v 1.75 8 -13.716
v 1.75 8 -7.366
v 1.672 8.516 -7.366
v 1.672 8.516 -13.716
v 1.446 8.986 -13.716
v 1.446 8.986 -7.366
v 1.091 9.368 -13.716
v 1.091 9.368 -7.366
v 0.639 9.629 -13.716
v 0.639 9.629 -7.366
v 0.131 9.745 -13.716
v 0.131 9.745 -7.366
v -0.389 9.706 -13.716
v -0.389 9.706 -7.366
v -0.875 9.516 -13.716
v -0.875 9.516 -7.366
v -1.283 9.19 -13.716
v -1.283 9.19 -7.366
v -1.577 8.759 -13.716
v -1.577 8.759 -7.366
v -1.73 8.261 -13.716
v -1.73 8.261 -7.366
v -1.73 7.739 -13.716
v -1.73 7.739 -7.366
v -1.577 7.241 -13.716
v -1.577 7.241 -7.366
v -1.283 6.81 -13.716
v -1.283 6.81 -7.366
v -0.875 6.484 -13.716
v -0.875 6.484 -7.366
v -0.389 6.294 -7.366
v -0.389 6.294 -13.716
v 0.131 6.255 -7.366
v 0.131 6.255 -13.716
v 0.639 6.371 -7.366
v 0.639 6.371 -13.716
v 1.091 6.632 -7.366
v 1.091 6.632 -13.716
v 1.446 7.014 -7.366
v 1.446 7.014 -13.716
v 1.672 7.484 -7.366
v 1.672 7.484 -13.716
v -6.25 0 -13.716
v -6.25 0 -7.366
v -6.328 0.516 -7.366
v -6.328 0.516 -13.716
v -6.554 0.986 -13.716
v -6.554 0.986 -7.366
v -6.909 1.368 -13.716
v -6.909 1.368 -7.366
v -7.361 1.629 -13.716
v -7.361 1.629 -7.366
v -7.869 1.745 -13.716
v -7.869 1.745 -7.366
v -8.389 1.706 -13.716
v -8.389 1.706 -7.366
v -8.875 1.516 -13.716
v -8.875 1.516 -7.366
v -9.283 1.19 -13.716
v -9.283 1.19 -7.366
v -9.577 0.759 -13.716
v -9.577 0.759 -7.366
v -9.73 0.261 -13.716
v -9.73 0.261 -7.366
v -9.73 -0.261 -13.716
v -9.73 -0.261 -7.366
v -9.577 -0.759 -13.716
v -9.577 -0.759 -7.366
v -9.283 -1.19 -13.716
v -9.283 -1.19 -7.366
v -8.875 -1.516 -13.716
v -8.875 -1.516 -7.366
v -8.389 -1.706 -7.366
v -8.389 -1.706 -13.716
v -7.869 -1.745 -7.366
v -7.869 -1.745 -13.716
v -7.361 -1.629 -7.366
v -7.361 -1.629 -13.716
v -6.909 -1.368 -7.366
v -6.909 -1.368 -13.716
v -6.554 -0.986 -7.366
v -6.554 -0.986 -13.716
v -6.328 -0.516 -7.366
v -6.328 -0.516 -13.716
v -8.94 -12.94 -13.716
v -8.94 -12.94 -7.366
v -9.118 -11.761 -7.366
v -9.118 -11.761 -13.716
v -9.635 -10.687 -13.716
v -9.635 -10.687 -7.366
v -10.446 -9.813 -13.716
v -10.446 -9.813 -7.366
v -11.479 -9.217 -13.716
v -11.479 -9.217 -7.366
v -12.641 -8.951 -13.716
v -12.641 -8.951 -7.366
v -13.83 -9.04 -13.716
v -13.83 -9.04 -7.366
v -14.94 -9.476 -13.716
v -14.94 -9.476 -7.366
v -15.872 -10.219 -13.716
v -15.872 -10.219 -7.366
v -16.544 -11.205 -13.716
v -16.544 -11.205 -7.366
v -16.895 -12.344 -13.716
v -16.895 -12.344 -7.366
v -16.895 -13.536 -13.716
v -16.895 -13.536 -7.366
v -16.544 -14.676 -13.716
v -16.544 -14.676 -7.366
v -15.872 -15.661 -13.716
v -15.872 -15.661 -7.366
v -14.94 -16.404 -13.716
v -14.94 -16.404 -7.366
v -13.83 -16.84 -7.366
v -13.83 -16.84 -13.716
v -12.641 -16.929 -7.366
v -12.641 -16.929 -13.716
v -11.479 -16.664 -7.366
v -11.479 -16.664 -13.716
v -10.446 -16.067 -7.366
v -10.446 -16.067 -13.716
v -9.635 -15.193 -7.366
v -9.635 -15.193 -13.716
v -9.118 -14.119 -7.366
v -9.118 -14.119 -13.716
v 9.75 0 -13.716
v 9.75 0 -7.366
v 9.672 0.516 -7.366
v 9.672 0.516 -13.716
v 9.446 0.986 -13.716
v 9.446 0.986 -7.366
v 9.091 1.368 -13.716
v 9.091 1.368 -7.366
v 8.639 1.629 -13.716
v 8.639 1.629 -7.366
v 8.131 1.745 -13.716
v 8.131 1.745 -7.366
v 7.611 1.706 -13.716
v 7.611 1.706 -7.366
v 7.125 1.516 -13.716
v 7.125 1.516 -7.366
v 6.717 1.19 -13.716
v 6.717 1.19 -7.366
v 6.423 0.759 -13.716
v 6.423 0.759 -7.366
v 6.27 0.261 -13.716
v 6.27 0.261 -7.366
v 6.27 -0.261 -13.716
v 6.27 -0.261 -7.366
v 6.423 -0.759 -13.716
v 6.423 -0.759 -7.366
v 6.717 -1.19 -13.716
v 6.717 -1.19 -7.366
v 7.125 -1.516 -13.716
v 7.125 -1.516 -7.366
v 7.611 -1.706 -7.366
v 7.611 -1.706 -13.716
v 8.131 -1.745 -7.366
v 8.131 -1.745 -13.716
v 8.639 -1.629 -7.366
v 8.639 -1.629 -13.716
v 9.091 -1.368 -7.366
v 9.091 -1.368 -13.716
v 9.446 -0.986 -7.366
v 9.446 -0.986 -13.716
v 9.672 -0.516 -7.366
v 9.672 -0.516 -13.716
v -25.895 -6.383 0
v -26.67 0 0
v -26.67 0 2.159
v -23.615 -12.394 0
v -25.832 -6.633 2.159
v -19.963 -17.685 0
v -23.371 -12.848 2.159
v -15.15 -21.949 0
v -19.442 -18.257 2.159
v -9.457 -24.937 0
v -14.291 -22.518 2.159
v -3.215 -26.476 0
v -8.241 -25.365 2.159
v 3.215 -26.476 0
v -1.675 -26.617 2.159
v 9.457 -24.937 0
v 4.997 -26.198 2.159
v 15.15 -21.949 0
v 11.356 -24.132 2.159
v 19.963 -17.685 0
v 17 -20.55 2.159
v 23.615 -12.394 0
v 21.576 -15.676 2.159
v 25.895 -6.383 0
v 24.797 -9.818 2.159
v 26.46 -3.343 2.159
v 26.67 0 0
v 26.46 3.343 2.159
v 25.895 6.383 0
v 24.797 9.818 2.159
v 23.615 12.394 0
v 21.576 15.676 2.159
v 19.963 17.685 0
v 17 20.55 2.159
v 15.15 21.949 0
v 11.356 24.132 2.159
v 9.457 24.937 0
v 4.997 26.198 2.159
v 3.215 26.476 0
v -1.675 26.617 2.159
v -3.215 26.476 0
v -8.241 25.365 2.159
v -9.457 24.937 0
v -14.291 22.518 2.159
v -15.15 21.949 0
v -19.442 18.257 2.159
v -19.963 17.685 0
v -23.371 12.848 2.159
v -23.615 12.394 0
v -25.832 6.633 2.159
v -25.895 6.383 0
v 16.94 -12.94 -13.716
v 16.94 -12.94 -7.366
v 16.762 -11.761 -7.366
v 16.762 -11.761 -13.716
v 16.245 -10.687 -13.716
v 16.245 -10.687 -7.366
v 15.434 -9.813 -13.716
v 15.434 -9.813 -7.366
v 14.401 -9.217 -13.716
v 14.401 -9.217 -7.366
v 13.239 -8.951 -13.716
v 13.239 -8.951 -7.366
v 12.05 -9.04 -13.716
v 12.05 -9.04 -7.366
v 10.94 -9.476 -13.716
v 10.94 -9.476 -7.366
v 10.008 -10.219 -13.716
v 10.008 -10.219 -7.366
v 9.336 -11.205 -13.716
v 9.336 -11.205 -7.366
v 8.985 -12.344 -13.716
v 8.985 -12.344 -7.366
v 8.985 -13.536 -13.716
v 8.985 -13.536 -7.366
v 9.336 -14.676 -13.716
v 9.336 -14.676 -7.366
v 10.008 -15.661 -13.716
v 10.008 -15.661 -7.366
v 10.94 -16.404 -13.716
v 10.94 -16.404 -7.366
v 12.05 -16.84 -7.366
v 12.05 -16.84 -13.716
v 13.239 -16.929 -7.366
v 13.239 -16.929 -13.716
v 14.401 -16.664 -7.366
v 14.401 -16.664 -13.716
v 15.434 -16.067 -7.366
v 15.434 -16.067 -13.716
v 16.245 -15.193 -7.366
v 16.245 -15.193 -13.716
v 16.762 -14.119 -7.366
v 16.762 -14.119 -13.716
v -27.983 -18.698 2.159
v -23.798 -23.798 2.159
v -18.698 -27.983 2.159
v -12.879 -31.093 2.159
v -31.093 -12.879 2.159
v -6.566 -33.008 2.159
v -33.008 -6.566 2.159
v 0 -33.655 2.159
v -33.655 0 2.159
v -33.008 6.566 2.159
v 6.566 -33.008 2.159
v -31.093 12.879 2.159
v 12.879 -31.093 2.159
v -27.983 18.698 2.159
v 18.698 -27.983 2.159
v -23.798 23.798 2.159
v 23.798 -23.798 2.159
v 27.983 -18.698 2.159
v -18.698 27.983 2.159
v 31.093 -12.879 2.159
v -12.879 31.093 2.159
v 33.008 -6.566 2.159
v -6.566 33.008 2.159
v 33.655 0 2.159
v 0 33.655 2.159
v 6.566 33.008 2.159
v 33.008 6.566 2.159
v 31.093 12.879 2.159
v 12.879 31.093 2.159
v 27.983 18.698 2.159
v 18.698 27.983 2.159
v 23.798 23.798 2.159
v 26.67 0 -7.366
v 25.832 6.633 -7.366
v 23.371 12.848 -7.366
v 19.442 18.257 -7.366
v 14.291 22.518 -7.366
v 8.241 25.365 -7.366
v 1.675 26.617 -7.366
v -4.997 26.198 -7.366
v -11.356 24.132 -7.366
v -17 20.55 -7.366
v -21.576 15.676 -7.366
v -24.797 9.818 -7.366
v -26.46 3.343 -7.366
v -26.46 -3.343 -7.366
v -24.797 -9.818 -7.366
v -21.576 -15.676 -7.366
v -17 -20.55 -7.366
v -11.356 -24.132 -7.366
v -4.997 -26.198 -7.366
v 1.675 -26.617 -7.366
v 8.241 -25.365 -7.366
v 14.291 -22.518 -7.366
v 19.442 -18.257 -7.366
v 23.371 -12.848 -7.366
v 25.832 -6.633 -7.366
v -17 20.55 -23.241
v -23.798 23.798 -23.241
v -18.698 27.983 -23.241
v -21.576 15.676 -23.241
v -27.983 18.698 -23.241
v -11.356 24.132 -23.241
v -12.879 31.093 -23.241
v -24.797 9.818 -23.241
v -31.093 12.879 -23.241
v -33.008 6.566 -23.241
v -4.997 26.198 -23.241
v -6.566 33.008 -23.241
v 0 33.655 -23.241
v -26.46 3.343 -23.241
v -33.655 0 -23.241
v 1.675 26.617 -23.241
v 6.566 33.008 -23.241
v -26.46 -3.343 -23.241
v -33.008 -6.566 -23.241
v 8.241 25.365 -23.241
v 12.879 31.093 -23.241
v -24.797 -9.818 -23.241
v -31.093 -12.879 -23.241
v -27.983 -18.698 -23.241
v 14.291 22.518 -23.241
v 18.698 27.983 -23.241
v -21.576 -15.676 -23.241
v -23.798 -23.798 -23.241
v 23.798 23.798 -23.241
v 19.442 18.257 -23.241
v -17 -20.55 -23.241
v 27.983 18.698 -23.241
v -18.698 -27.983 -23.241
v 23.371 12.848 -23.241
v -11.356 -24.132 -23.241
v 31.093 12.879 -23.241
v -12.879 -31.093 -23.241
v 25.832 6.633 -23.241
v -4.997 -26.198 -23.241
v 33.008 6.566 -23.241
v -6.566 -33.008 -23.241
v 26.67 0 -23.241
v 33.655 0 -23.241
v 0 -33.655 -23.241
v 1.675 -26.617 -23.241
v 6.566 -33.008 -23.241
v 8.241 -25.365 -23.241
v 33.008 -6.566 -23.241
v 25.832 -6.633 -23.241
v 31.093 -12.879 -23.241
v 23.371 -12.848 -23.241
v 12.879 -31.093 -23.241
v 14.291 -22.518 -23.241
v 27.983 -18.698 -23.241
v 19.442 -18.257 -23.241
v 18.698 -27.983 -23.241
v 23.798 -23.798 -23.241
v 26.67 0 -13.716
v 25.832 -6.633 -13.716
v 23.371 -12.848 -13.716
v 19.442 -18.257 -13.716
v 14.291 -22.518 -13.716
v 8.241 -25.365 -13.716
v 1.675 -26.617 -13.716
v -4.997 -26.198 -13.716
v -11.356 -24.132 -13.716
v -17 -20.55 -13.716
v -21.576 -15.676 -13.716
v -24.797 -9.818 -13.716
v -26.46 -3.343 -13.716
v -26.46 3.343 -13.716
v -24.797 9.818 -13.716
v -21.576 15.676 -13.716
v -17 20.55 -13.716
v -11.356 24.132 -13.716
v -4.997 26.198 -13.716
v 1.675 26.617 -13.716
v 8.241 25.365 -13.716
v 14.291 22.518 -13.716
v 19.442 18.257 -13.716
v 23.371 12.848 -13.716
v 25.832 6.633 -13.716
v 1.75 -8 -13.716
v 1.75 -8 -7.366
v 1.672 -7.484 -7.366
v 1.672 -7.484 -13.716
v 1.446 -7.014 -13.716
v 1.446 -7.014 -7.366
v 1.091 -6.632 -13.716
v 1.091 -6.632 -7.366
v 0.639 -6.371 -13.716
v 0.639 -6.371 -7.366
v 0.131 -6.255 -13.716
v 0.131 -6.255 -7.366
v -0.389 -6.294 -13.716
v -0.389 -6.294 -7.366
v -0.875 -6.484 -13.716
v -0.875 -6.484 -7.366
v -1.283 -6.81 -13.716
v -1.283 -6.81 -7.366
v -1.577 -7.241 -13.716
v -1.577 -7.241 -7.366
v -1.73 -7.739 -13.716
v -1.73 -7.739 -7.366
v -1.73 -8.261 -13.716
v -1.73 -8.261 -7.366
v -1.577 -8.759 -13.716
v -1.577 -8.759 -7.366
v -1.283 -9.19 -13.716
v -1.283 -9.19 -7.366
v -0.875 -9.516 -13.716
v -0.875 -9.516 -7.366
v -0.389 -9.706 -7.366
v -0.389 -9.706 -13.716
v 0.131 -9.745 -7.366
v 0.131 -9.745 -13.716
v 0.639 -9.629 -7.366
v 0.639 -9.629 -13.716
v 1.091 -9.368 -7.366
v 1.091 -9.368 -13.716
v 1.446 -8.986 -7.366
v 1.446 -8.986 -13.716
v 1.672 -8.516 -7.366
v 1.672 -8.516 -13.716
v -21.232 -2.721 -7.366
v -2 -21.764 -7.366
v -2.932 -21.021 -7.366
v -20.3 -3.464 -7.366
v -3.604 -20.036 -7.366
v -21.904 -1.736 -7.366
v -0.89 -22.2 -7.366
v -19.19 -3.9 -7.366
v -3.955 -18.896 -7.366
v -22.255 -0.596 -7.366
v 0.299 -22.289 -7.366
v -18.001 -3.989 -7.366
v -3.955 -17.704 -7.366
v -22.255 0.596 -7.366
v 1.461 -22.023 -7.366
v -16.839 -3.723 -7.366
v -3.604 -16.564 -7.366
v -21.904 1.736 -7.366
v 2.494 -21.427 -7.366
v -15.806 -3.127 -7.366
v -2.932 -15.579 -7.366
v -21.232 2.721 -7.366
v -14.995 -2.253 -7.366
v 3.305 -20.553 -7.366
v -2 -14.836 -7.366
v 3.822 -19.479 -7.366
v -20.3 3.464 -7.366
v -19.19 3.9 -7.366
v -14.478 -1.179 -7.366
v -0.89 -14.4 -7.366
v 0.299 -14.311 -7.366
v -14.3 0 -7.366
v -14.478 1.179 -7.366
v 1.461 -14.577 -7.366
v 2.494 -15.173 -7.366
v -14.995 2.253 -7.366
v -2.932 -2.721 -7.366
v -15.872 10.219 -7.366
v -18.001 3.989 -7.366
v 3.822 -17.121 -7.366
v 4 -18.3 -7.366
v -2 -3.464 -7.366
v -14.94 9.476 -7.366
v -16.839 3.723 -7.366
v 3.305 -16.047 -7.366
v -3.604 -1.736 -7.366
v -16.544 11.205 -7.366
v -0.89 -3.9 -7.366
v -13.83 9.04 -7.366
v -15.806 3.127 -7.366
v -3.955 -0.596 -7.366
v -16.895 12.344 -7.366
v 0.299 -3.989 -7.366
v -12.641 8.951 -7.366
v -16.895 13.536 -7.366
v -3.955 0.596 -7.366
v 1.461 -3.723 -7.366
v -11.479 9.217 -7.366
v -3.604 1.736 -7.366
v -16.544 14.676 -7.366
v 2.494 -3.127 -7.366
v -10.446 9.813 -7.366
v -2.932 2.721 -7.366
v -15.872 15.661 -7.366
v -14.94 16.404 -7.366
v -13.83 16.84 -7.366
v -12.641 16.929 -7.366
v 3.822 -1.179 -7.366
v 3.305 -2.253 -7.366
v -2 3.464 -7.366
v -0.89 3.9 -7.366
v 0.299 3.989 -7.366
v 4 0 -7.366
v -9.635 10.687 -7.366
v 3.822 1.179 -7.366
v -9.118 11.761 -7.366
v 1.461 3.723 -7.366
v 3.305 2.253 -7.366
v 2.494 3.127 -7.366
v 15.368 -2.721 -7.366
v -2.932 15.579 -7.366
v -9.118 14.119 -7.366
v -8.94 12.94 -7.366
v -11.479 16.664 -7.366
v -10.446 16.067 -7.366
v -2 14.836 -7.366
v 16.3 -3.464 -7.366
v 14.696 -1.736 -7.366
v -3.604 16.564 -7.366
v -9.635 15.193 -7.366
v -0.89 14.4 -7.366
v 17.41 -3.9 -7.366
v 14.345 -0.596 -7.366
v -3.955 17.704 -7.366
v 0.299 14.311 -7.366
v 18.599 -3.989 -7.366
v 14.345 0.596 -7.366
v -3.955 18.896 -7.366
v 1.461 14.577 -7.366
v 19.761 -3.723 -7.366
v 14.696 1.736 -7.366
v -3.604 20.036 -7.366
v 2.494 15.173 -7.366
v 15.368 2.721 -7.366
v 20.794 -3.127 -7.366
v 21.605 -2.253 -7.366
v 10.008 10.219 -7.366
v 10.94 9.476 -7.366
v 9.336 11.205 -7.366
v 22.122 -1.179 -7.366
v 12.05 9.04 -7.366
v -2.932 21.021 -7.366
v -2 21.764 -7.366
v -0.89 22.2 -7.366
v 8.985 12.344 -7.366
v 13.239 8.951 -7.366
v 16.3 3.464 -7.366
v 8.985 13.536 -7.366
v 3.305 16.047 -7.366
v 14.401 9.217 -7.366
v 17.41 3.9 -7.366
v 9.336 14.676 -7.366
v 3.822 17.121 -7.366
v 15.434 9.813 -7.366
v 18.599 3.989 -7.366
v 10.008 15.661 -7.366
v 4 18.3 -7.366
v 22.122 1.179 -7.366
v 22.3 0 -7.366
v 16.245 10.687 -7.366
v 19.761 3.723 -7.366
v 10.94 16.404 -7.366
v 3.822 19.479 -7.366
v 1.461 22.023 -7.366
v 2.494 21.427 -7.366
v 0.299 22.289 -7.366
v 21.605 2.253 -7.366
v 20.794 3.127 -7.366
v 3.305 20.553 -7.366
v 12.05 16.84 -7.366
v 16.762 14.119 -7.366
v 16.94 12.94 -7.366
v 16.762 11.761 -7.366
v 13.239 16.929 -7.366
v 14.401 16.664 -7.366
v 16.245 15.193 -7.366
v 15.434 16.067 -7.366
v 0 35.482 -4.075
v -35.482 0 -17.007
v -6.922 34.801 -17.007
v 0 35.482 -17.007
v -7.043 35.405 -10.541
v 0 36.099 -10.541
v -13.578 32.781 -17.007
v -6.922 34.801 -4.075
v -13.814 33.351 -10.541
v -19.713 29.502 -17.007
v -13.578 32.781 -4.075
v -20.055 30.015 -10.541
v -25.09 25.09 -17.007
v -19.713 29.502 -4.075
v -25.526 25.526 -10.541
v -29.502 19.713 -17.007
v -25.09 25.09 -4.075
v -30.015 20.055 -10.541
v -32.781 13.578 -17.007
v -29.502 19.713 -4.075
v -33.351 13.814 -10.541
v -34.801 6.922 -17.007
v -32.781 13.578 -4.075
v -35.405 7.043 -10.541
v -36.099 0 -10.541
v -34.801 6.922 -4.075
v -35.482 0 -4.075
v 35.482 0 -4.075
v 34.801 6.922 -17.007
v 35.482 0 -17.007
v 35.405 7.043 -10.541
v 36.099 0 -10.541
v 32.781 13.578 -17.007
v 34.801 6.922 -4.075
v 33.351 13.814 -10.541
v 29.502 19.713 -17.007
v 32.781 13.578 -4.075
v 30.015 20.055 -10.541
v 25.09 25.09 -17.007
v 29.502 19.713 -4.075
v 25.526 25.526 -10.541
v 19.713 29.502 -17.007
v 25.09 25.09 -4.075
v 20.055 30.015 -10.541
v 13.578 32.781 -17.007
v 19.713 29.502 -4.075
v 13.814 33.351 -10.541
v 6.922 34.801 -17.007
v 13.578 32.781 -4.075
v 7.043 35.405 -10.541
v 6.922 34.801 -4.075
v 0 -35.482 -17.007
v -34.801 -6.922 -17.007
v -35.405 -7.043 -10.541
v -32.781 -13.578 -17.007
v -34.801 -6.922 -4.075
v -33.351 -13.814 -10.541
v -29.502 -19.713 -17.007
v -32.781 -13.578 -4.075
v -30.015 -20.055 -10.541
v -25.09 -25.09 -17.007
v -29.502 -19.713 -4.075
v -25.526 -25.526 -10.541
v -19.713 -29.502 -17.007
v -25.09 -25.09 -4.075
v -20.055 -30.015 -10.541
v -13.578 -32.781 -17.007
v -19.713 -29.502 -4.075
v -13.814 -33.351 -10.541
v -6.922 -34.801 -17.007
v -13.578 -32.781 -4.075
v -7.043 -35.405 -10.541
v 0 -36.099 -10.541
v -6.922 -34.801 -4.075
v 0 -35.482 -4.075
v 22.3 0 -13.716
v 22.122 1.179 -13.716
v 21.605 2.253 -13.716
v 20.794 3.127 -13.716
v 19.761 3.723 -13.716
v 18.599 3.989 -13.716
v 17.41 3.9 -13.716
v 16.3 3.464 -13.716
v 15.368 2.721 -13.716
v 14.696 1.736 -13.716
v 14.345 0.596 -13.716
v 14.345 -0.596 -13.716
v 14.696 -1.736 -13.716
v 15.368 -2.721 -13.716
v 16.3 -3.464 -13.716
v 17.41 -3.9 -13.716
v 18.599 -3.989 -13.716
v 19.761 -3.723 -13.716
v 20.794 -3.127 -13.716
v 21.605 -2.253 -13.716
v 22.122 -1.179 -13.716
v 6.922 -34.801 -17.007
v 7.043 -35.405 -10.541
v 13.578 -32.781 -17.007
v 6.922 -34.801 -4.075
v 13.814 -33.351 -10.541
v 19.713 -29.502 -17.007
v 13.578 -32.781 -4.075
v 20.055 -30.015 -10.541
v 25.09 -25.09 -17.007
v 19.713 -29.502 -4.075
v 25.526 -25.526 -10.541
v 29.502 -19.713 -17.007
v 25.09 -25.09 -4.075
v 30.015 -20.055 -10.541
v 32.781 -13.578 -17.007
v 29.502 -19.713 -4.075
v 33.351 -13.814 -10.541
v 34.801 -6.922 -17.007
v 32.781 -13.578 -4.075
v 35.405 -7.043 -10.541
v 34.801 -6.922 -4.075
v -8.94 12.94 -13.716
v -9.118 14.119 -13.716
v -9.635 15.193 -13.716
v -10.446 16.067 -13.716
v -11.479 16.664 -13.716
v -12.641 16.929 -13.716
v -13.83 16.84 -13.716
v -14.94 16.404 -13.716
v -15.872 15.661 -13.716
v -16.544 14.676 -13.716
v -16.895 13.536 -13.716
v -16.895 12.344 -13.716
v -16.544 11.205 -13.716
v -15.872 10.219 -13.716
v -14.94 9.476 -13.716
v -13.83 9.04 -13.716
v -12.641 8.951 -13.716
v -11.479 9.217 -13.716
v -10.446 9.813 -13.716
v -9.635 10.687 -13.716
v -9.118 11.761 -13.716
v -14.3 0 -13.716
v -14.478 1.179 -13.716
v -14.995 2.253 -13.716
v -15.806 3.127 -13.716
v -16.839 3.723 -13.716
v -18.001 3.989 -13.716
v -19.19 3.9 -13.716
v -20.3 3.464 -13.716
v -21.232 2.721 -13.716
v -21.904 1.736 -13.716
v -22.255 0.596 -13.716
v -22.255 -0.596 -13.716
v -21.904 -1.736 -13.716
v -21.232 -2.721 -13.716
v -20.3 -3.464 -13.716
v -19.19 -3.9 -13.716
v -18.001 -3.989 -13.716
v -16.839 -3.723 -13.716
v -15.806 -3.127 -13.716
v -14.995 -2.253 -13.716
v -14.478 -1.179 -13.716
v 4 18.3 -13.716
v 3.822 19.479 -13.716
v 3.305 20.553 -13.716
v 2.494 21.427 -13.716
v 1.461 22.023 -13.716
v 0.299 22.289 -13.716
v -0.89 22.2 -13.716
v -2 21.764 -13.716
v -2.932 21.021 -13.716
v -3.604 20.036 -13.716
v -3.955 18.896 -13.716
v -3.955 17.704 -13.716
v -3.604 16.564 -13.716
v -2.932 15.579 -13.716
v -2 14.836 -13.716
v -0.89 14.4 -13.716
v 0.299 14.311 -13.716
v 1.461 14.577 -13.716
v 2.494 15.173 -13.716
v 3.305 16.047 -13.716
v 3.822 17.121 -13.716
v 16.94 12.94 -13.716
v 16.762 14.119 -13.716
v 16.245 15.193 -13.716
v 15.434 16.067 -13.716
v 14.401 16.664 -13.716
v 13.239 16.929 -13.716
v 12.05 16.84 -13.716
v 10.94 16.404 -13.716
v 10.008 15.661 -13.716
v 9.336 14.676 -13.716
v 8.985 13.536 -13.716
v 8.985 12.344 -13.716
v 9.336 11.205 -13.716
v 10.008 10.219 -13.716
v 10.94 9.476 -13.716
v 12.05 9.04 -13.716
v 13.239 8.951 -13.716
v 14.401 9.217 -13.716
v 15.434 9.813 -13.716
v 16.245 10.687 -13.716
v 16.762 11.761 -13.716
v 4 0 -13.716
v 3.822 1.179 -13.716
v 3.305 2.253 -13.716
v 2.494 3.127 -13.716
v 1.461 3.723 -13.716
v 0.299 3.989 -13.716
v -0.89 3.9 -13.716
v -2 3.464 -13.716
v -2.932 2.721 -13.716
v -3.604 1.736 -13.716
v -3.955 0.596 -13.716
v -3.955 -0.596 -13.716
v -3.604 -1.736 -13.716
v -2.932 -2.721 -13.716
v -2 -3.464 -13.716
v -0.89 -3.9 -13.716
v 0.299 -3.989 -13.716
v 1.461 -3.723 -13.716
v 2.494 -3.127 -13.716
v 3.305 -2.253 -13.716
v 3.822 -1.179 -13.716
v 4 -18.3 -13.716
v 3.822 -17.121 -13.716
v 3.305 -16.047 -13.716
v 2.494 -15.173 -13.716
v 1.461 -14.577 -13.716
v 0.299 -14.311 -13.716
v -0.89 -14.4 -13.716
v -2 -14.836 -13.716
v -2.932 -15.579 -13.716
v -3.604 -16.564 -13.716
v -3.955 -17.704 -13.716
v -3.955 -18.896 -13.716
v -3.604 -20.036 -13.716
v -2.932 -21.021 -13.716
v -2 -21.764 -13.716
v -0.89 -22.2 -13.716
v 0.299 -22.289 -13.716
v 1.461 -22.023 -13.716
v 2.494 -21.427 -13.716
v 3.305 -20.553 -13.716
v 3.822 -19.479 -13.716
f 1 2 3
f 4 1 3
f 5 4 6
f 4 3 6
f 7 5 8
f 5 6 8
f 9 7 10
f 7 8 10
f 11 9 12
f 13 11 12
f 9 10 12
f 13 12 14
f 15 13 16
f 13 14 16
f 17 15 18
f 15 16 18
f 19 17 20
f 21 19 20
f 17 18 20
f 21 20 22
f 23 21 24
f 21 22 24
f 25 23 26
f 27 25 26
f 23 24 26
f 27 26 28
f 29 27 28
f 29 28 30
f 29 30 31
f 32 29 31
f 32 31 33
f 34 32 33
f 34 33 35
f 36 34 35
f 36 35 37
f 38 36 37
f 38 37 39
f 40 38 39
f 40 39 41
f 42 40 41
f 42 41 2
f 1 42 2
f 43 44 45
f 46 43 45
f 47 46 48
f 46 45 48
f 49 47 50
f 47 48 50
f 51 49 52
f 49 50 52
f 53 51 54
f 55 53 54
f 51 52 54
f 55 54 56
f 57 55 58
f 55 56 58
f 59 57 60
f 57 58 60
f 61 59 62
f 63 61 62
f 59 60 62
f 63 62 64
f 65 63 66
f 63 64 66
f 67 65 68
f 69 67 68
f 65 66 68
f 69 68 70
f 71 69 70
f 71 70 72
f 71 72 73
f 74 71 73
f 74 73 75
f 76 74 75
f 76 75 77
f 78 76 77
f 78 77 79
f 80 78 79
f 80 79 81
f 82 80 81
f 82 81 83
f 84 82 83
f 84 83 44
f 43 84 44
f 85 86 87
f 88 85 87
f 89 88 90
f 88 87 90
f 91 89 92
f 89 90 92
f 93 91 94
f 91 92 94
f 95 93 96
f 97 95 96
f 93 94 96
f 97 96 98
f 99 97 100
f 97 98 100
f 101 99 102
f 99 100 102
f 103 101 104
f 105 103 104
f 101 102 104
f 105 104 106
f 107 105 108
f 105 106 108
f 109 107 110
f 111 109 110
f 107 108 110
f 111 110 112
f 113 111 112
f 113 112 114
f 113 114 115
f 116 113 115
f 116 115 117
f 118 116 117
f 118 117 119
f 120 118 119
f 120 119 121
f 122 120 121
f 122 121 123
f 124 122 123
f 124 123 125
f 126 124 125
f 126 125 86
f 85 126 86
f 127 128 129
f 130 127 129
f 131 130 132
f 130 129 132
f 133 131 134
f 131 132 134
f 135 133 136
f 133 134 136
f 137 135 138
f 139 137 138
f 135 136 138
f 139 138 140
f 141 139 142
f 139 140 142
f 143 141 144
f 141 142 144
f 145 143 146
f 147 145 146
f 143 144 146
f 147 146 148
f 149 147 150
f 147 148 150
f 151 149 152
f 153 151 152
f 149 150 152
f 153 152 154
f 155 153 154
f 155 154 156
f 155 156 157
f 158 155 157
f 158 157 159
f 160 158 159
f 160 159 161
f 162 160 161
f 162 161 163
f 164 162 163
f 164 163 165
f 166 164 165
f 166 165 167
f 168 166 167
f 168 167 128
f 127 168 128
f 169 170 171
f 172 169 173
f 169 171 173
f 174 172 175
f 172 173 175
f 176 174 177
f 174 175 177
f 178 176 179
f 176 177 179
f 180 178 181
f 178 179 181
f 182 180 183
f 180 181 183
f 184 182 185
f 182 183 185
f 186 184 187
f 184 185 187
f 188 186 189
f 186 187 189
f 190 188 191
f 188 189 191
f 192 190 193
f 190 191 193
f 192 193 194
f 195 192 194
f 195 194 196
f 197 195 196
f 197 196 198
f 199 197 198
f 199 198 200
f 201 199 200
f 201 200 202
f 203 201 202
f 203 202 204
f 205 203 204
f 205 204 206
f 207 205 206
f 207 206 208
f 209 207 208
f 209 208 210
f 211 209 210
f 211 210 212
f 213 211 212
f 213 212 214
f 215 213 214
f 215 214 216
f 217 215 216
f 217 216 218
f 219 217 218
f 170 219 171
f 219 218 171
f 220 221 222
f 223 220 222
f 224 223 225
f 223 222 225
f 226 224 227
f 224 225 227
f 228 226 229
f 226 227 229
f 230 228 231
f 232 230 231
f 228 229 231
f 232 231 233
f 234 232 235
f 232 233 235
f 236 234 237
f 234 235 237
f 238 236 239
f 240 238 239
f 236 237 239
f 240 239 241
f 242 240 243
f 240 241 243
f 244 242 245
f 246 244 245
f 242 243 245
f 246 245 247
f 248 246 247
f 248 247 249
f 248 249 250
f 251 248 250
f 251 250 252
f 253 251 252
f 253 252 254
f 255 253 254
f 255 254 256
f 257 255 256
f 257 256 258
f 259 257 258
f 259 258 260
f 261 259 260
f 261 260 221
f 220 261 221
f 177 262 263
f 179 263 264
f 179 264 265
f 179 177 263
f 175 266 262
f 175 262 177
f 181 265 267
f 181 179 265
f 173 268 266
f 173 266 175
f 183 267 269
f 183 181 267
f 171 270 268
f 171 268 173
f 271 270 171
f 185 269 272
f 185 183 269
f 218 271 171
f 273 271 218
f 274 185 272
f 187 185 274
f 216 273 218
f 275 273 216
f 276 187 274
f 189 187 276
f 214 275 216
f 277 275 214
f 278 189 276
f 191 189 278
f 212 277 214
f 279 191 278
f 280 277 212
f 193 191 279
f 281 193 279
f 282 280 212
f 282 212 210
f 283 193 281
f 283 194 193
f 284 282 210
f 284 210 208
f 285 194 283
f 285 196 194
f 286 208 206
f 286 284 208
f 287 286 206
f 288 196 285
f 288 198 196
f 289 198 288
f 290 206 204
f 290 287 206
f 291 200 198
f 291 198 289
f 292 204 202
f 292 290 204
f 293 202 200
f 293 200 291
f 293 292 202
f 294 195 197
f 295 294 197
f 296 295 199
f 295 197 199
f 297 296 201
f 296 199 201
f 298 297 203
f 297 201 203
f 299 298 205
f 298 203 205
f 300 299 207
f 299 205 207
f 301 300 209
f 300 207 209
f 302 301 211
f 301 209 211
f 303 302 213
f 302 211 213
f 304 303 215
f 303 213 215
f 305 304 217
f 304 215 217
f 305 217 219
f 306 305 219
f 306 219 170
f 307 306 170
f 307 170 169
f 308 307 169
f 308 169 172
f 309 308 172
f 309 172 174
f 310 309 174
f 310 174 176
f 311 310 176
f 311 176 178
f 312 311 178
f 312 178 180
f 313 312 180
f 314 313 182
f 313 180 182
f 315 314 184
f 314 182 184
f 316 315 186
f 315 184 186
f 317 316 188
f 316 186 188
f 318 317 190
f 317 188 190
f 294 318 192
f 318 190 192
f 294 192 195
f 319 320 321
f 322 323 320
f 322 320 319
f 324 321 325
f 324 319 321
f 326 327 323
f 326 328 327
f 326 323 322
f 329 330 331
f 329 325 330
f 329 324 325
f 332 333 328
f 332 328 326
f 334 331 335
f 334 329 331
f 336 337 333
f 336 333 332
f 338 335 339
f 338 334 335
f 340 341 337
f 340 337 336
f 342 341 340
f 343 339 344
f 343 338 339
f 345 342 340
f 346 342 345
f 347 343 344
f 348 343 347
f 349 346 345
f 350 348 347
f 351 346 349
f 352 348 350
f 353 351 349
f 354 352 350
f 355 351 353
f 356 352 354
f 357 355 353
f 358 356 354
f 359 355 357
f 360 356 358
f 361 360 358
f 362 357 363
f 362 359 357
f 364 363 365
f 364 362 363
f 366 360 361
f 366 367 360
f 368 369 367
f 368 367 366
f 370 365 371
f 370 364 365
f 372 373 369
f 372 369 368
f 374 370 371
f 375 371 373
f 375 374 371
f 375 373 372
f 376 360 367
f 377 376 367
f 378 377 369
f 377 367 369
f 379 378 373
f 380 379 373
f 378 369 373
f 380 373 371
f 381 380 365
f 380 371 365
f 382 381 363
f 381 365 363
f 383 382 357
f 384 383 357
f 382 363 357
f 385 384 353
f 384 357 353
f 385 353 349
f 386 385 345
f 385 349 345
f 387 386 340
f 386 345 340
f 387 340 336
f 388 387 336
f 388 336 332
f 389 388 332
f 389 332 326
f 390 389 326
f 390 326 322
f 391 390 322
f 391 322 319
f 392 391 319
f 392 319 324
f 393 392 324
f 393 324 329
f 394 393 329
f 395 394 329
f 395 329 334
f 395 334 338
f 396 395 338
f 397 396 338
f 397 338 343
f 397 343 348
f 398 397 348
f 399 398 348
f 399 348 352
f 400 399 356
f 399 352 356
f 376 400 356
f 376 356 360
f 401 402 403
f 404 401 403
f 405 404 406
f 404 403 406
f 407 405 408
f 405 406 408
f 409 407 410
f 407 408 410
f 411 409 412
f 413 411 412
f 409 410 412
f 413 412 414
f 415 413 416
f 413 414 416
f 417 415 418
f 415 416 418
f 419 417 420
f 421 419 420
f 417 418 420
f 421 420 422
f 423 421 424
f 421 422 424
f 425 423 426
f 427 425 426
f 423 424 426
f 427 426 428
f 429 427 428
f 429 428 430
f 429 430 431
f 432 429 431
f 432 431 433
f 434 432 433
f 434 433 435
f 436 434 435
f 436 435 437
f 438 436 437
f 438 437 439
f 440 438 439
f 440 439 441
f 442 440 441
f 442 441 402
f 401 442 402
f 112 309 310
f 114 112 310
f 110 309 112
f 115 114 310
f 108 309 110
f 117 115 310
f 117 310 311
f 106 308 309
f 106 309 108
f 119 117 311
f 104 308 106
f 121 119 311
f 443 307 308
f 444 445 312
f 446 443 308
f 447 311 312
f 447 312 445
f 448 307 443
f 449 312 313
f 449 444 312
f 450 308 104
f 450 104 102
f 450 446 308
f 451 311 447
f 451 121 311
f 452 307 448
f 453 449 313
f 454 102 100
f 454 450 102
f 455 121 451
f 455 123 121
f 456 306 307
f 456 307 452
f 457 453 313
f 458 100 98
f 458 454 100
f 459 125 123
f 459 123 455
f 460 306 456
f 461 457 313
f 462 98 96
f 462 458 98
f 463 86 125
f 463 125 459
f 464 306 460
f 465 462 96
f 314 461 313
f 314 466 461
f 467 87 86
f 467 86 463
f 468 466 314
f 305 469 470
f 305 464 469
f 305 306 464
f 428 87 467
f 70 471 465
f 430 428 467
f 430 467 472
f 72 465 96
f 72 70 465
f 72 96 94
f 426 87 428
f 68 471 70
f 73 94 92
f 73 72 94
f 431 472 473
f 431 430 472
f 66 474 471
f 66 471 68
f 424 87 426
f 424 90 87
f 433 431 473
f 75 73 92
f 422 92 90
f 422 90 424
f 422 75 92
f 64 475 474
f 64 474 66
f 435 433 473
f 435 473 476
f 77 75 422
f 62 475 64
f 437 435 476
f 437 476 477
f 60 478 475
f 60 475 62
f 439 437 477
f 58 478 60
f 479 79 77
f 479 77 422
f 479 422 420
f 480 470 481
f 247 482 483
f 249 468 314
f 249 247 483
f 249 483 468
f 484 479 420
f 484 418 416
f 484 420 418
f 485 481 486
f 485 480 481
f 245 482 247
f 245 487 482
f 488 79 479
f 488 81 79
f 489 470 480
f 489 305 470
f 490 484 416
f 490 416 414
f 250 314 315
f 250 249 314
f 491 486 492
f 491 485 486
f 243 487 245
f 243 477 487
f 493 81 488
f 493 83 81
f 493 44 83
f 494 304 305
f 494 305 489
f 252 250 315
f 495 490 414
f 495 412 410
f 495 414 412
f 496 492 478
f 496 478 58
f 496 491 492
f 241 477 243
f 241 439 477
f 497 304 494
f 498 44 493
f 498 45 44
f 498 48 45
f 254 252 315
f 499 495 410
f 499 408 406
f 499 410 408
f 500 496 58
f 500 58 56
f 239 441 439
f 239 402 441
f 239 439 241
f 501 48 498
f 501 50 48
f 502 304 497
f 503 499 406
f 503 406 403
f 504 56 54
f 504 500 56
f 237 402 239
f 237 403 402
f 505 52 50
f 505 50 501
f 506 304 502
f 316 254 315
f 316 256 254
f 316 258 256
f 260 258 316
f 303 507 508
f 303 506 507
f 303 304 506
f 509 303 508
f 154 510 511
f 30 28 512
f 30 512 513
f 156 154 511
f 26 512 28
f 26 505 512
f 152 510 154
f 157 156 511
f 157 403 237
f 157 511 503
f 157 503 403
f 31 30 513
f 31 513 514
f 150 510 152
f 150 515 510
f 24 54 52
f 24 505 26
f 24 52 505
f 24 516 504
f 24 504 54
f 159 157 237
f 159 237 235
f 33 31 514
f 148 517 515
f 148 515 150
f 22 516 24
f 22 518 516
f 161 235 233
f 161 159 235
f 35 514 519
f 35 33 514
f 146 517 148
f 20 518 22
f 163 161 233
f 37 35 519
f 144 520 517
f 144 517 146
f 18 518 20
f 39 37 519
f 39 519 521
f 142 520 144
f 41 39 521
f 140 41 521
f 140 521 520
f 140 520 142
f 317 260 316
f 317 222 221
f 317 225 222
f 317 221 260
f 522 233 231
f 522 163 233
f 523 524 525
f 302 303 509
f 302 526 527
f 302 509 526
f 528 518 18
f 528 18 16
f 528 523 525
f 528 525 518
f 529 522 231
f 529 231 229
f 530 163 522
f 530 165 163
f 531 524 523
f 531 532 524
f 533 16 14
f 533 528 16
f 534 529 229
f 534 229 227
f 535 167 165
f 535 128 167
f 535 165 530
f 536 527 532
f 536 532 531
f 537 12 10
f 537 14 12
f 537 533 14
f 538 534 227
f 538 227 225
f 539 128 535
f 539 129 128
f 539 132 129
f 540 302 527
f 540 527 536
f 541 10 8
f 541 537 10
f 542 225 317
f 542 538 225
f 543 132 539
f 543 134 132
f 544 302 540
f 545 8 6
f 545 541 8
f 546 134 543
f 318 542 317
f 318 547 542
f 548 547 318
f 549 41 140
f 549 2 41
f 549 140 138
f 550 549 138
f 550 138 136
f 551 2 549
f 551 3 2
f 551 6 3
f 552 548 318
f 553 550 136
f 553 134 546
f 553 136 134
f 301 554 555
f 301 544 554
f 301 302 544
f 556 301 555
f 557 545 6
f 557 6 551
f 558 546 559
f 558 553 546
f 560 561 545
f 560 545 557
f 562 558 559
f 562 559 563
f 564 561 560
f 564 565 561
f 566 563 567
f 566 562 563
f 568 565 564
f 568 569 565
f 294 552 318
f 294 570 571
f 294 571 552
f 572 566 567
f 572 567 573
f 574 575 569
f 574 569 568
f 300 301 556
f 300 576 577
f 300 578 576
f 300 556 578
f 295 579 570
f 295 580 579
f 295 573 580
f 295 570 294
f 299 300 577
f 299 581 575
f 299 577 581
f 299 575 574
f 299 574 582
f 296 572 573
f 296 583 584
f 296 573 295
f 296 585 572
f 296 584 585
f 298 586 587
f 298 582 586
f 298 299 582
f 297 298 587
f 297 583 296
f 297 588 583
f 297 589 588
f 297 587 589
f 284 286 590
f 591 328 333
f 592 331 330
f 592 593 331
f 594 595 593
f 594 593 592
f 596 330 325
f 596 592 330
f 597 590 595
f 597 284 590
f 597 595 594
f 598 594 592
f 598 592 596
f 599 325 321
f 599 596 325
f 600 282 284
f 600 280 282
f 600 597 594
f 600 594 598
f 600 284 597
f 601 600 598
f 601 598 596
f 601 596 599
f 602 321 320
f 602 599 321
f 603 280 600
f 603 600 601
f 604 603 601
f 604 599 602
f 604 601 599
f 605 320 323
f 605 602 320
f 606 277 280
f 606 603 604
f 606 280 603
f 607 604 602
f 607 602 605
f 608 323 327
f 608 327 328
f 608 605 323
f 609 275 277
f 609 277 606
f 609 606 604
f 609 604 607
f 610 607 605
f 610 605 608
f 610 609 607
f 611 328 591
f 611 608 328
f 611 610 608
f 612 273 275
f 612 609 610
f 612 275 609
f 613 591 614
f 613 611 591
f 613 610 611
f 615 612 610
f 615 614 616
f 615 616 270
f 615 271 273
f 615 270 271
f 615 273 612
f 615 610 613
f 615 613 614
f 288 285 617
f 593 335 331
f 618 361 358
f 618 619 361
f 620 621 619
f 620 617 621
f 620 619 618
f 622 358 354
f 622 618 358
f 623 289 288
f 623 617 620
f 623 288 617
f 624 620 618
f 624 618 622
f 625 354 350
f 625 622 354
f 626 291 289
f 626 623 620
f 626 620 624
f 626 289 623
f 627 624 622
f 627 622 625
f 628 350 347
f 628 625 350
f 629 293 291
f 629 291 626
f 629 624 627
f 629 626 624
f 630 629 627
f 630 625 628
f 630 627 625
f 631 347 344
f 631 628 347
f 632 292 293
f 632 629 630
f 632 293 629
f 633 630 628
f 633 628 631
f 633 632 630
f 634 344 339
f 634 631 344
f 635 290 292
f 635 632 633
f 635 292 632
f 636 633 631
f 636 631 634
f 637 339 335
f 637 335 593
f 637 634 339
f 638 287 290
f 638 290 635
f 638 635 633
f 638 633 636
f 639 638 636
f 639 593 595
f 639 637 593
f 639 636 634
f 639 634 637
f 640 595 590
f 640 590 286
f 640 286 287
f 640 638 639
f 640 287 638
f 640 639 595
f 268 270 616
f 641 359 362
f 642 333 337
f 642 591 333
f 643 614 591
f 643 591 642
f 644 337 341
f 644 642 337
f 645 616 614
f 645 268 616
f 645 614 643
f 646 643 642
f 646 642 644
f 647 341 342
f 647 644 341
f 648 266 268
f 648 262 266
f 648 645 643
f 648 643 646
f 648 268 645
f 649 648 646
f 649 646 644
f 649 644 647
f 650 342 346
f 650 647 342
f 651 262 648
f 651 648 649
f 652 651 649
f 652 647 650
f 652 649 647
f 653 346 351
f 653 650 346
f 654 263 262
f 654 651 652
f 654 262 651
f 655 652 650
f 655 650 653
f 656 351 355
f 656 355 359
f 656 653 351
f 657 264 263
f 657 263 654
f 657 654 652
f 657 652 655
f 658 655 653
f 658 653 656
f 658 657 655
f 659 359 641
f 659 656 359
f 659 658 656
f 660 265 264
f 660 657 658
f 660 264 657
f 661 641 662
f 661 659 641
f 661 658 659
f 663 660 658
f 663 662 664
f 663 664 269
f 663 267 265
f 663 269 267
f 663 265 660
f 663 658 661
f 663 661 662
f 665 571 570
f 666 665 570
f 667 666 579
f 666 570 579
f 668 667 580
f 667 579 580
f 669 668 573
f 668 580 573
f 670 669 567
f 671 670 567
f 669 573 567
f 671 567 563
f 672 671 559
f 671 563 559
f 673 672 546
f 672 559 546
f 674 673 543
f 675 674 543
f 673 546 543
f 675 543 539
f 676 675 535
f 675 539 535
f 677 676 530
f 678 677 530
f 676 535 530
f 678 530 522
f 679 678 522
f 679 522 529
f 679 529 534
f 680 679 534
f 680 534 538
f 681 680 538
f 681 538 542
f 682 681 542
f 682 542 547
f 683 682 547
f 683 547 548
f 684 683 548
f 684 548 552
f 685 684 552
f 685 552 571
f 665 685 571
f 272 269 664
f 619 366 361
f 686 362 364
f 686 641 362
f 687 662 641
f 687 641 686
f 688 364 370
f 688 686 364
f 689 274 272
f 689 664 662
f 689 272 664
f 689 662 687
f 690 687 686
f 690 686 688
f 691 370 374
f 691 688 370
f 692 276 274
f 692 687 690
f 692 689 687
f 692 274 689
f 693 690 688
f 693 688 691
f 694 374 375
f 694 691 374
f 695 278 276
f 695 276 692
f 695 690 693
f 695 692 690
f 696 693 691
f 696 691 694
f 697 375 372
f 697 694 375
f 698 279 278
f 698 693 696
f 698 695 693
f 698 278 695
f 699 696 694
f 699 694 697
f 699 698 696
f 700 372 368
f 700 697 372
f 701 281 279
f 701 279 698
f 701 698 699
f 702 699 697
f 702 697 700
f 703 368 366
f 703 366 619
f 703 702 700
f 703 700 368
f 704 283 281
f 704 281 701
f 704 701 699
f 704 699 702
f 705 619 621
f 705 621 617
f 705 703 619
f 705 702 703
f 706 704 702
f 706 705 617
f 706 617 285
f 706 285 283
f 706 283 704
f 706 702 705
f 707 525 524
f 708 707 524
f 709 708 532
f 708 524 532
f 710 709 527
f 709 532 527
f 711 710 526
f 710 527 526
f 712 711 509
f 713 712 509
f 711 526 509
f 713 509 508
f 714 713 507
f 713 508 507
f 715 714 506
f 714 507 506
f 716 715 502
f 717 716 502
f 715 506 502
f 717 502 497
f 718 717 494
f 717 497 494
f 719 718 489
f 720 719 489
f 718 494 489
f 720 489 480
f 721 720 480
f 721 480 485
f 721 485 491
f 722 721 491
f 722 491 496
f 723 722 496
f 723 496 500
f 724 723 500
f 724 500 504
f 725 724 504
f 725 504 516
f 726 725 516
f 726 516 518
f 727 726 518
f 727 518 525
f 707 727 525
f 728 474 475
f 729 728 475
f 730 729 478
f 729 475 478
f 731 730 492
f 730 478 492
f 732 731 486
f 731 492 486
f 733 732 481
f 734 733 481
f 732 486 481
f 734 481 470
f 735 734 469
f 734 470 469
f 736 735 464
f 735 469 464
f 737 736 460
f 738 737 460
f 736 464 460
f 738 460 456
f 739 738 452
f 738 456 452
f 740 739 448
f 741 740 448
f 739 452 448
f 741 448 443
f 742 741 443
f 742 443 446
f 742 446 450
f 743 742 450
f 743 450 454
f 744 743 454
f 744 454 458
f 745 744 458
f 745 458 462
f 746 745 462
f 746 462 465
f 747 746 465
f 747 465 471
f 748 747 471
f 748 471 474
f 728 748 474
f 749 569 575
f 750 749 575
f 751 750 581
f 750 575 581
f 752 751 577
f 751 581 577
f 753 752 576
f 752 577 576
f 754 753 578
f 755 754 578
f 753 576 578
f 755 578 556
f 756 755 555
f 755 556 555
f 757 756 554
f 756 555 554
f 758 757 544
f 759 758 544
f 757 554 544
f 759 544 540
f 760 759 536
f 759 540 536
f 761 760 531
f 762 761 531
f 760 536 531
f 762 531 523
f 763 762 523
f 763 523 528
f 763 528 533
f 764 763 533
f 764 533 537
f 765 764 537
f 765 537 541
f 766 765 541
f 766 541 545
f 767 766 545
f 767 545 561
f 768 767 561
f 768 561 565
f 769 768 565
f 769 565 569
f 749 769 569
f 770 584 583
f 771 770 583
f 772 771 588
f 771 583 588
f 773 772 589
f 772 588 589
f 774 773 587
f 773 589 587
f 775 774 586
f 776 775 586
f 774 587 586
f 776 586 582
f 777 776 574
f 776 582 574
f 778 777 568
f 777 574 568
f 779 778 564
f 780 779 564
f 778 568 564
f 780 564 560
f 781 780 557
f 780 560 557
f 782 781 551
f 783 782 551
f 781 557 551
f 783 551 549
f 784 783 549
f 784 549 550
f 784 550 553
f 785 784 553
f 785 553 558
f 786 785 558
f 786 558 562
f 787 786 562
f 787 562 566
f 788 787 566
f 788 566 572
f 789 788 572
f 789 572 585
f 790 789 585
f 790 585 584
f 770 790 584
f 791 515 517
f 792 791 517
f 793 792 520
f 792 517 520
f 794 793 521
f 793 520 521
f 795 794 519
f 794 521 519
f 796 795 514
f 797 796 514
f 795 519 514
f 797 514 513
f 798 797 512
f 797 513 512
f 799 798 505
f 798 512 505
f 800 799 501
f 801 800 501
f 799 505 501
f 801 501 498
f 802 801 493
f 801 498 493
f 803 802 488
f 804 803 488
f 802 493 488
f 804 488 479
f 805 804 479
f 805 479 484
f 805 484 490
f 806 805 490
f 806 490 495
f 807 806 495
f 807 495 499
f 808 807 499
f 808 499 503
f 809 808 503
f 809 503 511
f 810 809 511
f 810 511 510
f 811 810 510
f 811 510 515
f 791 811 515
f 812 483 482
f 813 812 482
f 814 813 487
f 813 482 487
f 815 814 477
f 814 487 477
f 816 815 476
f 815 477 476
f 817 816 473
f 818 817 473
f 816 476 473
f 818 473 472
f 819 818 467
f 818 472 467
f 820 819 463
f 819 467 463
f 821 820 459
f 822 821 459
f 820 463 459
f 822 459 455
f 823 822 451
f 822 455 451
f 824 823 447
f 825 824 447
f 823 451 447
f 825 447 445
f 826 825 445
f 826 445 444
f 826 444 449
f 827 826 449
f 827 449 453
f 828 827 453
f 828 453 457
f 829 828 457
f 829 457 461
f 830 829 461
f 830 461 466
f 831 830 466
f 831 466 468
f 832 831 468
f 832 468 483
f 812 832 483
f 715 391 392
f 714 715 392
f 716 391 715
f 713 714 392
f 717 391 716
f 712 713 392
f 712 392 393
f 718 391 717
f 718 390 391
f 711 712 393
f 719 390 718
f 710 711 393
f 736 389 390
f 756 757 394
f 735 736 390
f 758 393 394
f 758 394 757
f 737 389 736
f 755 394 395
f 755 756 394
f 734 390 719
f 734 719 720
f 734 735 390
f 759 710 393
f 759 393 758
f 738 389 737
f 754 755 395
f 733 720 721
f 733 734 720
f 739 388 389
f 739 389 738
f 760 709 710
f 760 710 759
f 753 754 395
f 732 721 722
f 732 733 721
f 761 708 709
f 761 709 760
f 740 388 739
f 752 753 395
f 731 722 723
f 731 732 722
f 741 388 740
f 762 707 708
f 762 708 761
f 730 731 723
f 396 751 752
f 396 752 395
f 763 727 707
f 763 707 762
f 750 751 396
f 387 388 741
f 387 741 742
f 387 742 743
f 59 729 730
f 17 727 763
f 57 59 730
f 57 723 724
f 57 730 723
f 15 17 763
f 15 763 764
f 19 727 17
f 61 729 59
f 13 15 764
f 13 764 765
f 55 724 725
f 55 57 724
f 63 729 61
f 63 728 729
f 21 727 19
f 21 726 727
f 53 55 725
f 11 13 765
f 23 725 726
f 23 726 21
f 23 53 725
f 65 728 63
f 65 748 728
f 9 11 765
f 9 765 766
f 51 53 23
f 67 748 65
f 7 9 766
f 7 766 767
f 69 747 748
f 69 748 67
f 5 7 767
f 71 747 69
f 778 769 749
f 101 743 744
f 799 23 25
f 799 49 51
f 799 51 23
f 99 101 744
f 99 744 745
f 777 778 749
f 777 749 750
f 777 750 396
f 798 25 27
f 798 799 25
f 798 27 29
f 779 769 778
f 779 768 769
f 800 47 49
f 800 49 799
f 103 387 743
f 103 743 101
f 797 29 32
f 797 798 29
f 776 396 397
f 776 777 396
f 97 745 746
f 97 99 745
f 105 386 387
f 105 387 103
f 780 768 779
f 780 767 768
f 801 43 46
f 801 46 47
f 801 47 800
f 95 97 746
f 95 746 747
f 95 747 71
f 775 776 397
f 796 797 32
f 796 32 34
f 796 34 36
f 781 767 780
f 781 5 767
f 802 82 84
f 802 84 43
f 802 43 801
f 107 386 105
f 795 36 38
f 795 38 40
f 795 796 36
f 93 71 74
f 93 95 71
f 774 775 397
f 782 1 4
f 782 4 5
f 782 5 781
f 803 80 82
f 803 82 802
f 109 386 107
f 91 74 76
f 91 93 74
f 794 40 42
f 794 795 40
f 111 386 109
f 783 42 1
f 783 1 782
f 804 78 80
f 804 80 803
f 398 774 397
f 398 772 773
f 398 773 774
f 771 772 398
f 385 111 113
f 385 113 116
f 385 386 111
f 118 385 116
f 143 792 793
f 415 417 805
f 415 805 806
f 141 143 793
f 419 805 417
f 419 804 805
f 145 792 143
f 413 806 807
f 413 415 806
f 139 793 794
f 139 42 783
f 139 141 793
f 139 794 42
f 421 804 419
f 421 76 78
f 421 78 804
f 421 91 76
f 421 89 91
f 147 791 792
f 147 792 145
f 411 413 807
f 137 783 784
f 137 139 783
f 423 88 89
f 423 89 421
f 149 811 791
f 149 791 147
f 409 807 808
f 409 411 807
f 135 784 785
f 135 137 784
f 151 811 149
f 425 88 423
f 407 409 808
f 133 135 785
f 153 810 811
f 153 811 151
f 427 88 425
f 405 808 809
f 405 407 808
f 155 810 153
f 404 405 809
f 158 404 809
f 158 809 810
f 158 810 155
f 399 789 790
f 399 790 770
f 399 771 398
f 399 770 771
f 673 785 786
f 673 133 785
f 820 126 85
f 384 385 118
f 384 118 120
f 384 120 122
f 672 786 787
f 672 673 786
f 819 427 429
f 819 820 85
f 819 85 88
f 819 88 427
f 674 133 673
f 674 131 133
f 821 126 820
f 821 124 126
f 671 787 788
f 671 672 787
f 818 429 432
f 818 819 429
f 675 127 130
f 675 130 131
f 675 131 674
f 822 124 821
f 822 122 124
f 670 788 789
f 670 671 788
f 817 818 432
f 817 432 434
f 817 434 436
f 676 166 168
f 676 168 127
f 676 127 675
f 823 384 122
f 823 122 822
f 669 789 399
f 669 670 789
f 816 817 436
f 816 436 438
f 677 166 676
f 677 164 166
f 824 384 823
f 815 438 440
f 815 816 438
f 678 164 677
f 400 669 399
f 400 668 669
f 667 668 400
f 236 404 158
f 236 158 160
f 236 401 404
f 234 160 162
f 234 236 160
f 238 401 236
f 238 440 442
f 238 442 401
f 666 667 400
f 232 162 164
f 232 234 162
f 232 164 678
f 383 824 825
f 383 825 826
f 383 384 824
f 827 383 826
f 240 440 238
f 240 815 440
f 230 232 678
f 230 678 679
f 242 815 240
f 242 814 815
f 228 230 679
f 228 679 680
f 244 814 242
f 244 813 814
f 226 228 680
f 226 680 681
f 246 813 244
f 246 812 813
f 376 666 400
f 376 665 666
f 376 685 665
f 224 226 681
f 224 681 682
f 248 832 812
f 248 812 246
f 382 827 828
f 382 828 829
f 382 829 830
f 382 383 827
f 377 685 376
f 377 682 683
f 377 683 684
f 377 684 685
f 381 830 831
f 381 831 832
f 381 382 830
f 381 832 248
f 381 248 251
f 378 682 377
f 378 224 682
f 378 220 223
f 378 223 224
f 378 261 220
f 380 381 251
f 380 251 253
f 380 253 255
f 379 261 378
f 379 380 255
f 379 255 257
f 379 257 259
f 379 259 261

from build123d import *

# Parameters (mm, degrees)
SKETCH1_R          = 31.75
EXTRUDE1_DEPTH     = 21.082
SKETCH2_R          = 26.67
CUT_EXTRUDE1_DEPTH = 7.366
SKETCH3_R          = 26.67
CUT_EXTRUDE2_DEPTH = 7.366
SKETCH5_R          = 33.655
EXTRUDE3_DEPTH     = 2.159
CUT_EXTRUDE3_REACH = 54.967
SKETCH6_R          = 26.67
SKETCH7_R          = 33.655
EXTRUDE4_DEPTH     = 2.159
CUT_EXTRUDE4_REACH = 55.949
SKETCH8_R          = 26.67
SKETCH10_R         = 4
SKETCH10_R_2       = 1.75
CUT_EXTRUDE5_DEPTH = 54.462758337
SKETCH11_R         = 4
CUT_EXTRUDE6_DEPTH = 54.462758337
SKETCH12_R         = 4
CUT_EXTRUDE7_DEPTH = 54.462758337


with BuildPart() as part:
    # Sketch1 → Extrude1 (new body)
    with BuildSketch(Plane.XY):
        Circle(SKETCH1_R)
    extrude(amount=-EXTRUDE1_DEPTH)

    # Sketch2 → Cut-Extrude1 (cut)
    with BuildSketch(Plane.XY):
        Circle(SKETCH2_R)
    extrude(amount=-CUT_EXTRUDE1_DEPTH, mode=Mode.SUBTRACT)

    # Sketch3 → Cut-Extrude2 (cut)
    with BuildSketch(Plane(origin=(0, 0, -21.082), x_dir=(-1, 0, 0), z_dir=(0, 0, -1))):
        with Locations(Location((0, 0, 0), (0, 0, 180))):
            Circle(SKETCH3_R)
    extrude(amount=-CUT_EXTRUDE2_DEPTH, mode=Mode.SUBTRACT)

    # Sketch5 → Extrude3 (add)
    with BuildSketch(Plane.XY):
        Circle(SKETCH5_R)
    extrude(amount=EXTRUDE3_DEPTH)

    # Sketch6 → Cut-Extrude3 (cut, up to next)
    with BuildSketch(Plane.XY.offset(2.159), mode=Mode.PRIVATE) as cut_extrude3_sk1:
        with Locations(Location((0, 0, 0), (0, 0, 180))):
            Circle(SKETCH6_R)
    cut_extrude3_tool1 = extrude(cut_extrude3_sk1.sketch, amount=-CUT_EXTRUDE3_REACH, mode=Mode.PRIVATE) & part.part
    add(cut_extrude3_tool1.solids().sort_by_distance((0, 0, 2.159))[0], mode=Mode.SUBTRACT)

    # Sketch7 → Extrude4 (add)
    with BuildSketch(Plane(origin=(0, 0, -21.082), x_dir=(-1, 0, 0), z_dir=(0, 0, -1))):
        with Locations(Location((0, 0, 0), (0, 0, 180))):
            Circle(SKETCH7_R)
    extrude(amount=EXTRUDE4_DEPTH)

    # Sketch8 → Cut-Extrude4 (cut, up to next)
    with BuildSketch(Plane(origin=(0, 0, -23.241), x_dir=(-1, 0, 0), z_dir=(0, 0, -1)), mode=Mode.PRIVATE) as cut_extrude4_sk1:
        with Locations(Location((0, 0, 0), (0, 0, 180))):
            Circle(SKETCH8_R)
    cut_extrude4_tool1 = extrude(cut_extrude4_sk1.sketch, amount=-CUT_EXTRUDE4_REACH, mode=Mode.PRIVATE) & part.part
    add(cut_extrude4_tool1.solids().sort_by_distance((0, 0, -23.241))[0], mode=Mode.SUBTRACT)

    # Sweep2: sweep along a curve in space
    with BuildLine() as sweep2_path:
        ThreePointArc((33.655, 0, 2.159), (23.797678721, 23.797678721, 2.159), (0, 33.655, 2.159))
        ThreePointArc((0, 33.655, 2.159), (-23.797678721, 23.797678721, 2.159), (-33.655, 0, 2.159))
        ThreePointArc((-33.655, 0, 2.159), (-23.797678721, -23.797678721, 2.159), (0, -33.655, 2.159))
        ThreePointArc((0, -33.655, 2.159), (23.797678721, -23.797678721, 2.159), (33.655, 0, 2.159))
    # 3DSketch2 → Sweep2 (sweep)
    with BuildSketch(Plane(origin=(0, 33.655, 2.159), x_dir=(-8.931812198350224e-14, -0.9285876208505301, -0.37111323124236906), z_dir=(1, 0, 0))):
        with BuildLine():
            Line((0, 0), (0.801233466, 2.004820673))
            Line((0.801233466, 2.004820673), (2.570192884, 1.297849968))
            Line((2.570192884, 1.297849968), (10.394002025, 20.874334191))
            Line((10.394002025, 20.874334191), (8.625042607, 21.581304896))
            Line((8.625042607, 21.581304896), (9.426276074, 23.58612557))
            ThreePointArc((9.426276074, 23.58612557), (2.443828834, 12.7), (0, 0))
        make_face()
    sweep(path=sweep2_path.line)

    # Sketch10 → Cut-Extrude5 (cut, through all)
    with BuildSketch(Plane.XY.offset(-7.366)):
        Circle(SKETCH10_R)
        with Locations((0, 8)):
            Circle(SKETCH10_R_2)
        with Locations((8, 0)):
            Circle(SKETCH10_R_2)
        with Locations((0, -8)):
            Circle(SKETCH10_R_2)
        with Locations((-8, 0)):
            Circle(SKETCH10_R_2)
    extrude(amount=-CUT_EXTRUDE5_DEPTH, mode=Mode.SUBTRACT)

    # Sketch11 → Cut-Extrude6 (cut, through all)
    with BuildSketch(Plane.XY.offset(-7.366)):
        with Locations((0, 18.3)):
            Circle(SKETCH11_R)
        with Locations((18.3, 0)):
            Circle(SKETCH11_R)
        with Locations((0, -18.3)):
            Circle(SKETCH11_R)
        with Locations((-18.3, 0)):
            Circle(SKETCH11_R)
    extrude(amount=-CUT_EXTRUDE6_DEPTH, mode=Mode.SUBTRACT)

    # Sketch12 → Cut-Extrude7 (cut, through all)
    with BuildSketch(Plane.XY.offset(-7.366)):
        with Locations((12.940054096, 12.940054096)):
            Circle(SKETCH12_R)
        with Locations((12.940054096, -12.940054096)):
            Circle(SKETCH12_R)
        with Locations((-12.940054096, -12.940054096)):
            Circle(SKETCH12_R)
        with Locations((-12.940054096, 12.940054096)):
            Circle(SKETCH12_R)
    extrude(amount=-CUT_EXTRUDE7_DEPTH, mode=Mode.SUBTRACT)


solid = part.part
